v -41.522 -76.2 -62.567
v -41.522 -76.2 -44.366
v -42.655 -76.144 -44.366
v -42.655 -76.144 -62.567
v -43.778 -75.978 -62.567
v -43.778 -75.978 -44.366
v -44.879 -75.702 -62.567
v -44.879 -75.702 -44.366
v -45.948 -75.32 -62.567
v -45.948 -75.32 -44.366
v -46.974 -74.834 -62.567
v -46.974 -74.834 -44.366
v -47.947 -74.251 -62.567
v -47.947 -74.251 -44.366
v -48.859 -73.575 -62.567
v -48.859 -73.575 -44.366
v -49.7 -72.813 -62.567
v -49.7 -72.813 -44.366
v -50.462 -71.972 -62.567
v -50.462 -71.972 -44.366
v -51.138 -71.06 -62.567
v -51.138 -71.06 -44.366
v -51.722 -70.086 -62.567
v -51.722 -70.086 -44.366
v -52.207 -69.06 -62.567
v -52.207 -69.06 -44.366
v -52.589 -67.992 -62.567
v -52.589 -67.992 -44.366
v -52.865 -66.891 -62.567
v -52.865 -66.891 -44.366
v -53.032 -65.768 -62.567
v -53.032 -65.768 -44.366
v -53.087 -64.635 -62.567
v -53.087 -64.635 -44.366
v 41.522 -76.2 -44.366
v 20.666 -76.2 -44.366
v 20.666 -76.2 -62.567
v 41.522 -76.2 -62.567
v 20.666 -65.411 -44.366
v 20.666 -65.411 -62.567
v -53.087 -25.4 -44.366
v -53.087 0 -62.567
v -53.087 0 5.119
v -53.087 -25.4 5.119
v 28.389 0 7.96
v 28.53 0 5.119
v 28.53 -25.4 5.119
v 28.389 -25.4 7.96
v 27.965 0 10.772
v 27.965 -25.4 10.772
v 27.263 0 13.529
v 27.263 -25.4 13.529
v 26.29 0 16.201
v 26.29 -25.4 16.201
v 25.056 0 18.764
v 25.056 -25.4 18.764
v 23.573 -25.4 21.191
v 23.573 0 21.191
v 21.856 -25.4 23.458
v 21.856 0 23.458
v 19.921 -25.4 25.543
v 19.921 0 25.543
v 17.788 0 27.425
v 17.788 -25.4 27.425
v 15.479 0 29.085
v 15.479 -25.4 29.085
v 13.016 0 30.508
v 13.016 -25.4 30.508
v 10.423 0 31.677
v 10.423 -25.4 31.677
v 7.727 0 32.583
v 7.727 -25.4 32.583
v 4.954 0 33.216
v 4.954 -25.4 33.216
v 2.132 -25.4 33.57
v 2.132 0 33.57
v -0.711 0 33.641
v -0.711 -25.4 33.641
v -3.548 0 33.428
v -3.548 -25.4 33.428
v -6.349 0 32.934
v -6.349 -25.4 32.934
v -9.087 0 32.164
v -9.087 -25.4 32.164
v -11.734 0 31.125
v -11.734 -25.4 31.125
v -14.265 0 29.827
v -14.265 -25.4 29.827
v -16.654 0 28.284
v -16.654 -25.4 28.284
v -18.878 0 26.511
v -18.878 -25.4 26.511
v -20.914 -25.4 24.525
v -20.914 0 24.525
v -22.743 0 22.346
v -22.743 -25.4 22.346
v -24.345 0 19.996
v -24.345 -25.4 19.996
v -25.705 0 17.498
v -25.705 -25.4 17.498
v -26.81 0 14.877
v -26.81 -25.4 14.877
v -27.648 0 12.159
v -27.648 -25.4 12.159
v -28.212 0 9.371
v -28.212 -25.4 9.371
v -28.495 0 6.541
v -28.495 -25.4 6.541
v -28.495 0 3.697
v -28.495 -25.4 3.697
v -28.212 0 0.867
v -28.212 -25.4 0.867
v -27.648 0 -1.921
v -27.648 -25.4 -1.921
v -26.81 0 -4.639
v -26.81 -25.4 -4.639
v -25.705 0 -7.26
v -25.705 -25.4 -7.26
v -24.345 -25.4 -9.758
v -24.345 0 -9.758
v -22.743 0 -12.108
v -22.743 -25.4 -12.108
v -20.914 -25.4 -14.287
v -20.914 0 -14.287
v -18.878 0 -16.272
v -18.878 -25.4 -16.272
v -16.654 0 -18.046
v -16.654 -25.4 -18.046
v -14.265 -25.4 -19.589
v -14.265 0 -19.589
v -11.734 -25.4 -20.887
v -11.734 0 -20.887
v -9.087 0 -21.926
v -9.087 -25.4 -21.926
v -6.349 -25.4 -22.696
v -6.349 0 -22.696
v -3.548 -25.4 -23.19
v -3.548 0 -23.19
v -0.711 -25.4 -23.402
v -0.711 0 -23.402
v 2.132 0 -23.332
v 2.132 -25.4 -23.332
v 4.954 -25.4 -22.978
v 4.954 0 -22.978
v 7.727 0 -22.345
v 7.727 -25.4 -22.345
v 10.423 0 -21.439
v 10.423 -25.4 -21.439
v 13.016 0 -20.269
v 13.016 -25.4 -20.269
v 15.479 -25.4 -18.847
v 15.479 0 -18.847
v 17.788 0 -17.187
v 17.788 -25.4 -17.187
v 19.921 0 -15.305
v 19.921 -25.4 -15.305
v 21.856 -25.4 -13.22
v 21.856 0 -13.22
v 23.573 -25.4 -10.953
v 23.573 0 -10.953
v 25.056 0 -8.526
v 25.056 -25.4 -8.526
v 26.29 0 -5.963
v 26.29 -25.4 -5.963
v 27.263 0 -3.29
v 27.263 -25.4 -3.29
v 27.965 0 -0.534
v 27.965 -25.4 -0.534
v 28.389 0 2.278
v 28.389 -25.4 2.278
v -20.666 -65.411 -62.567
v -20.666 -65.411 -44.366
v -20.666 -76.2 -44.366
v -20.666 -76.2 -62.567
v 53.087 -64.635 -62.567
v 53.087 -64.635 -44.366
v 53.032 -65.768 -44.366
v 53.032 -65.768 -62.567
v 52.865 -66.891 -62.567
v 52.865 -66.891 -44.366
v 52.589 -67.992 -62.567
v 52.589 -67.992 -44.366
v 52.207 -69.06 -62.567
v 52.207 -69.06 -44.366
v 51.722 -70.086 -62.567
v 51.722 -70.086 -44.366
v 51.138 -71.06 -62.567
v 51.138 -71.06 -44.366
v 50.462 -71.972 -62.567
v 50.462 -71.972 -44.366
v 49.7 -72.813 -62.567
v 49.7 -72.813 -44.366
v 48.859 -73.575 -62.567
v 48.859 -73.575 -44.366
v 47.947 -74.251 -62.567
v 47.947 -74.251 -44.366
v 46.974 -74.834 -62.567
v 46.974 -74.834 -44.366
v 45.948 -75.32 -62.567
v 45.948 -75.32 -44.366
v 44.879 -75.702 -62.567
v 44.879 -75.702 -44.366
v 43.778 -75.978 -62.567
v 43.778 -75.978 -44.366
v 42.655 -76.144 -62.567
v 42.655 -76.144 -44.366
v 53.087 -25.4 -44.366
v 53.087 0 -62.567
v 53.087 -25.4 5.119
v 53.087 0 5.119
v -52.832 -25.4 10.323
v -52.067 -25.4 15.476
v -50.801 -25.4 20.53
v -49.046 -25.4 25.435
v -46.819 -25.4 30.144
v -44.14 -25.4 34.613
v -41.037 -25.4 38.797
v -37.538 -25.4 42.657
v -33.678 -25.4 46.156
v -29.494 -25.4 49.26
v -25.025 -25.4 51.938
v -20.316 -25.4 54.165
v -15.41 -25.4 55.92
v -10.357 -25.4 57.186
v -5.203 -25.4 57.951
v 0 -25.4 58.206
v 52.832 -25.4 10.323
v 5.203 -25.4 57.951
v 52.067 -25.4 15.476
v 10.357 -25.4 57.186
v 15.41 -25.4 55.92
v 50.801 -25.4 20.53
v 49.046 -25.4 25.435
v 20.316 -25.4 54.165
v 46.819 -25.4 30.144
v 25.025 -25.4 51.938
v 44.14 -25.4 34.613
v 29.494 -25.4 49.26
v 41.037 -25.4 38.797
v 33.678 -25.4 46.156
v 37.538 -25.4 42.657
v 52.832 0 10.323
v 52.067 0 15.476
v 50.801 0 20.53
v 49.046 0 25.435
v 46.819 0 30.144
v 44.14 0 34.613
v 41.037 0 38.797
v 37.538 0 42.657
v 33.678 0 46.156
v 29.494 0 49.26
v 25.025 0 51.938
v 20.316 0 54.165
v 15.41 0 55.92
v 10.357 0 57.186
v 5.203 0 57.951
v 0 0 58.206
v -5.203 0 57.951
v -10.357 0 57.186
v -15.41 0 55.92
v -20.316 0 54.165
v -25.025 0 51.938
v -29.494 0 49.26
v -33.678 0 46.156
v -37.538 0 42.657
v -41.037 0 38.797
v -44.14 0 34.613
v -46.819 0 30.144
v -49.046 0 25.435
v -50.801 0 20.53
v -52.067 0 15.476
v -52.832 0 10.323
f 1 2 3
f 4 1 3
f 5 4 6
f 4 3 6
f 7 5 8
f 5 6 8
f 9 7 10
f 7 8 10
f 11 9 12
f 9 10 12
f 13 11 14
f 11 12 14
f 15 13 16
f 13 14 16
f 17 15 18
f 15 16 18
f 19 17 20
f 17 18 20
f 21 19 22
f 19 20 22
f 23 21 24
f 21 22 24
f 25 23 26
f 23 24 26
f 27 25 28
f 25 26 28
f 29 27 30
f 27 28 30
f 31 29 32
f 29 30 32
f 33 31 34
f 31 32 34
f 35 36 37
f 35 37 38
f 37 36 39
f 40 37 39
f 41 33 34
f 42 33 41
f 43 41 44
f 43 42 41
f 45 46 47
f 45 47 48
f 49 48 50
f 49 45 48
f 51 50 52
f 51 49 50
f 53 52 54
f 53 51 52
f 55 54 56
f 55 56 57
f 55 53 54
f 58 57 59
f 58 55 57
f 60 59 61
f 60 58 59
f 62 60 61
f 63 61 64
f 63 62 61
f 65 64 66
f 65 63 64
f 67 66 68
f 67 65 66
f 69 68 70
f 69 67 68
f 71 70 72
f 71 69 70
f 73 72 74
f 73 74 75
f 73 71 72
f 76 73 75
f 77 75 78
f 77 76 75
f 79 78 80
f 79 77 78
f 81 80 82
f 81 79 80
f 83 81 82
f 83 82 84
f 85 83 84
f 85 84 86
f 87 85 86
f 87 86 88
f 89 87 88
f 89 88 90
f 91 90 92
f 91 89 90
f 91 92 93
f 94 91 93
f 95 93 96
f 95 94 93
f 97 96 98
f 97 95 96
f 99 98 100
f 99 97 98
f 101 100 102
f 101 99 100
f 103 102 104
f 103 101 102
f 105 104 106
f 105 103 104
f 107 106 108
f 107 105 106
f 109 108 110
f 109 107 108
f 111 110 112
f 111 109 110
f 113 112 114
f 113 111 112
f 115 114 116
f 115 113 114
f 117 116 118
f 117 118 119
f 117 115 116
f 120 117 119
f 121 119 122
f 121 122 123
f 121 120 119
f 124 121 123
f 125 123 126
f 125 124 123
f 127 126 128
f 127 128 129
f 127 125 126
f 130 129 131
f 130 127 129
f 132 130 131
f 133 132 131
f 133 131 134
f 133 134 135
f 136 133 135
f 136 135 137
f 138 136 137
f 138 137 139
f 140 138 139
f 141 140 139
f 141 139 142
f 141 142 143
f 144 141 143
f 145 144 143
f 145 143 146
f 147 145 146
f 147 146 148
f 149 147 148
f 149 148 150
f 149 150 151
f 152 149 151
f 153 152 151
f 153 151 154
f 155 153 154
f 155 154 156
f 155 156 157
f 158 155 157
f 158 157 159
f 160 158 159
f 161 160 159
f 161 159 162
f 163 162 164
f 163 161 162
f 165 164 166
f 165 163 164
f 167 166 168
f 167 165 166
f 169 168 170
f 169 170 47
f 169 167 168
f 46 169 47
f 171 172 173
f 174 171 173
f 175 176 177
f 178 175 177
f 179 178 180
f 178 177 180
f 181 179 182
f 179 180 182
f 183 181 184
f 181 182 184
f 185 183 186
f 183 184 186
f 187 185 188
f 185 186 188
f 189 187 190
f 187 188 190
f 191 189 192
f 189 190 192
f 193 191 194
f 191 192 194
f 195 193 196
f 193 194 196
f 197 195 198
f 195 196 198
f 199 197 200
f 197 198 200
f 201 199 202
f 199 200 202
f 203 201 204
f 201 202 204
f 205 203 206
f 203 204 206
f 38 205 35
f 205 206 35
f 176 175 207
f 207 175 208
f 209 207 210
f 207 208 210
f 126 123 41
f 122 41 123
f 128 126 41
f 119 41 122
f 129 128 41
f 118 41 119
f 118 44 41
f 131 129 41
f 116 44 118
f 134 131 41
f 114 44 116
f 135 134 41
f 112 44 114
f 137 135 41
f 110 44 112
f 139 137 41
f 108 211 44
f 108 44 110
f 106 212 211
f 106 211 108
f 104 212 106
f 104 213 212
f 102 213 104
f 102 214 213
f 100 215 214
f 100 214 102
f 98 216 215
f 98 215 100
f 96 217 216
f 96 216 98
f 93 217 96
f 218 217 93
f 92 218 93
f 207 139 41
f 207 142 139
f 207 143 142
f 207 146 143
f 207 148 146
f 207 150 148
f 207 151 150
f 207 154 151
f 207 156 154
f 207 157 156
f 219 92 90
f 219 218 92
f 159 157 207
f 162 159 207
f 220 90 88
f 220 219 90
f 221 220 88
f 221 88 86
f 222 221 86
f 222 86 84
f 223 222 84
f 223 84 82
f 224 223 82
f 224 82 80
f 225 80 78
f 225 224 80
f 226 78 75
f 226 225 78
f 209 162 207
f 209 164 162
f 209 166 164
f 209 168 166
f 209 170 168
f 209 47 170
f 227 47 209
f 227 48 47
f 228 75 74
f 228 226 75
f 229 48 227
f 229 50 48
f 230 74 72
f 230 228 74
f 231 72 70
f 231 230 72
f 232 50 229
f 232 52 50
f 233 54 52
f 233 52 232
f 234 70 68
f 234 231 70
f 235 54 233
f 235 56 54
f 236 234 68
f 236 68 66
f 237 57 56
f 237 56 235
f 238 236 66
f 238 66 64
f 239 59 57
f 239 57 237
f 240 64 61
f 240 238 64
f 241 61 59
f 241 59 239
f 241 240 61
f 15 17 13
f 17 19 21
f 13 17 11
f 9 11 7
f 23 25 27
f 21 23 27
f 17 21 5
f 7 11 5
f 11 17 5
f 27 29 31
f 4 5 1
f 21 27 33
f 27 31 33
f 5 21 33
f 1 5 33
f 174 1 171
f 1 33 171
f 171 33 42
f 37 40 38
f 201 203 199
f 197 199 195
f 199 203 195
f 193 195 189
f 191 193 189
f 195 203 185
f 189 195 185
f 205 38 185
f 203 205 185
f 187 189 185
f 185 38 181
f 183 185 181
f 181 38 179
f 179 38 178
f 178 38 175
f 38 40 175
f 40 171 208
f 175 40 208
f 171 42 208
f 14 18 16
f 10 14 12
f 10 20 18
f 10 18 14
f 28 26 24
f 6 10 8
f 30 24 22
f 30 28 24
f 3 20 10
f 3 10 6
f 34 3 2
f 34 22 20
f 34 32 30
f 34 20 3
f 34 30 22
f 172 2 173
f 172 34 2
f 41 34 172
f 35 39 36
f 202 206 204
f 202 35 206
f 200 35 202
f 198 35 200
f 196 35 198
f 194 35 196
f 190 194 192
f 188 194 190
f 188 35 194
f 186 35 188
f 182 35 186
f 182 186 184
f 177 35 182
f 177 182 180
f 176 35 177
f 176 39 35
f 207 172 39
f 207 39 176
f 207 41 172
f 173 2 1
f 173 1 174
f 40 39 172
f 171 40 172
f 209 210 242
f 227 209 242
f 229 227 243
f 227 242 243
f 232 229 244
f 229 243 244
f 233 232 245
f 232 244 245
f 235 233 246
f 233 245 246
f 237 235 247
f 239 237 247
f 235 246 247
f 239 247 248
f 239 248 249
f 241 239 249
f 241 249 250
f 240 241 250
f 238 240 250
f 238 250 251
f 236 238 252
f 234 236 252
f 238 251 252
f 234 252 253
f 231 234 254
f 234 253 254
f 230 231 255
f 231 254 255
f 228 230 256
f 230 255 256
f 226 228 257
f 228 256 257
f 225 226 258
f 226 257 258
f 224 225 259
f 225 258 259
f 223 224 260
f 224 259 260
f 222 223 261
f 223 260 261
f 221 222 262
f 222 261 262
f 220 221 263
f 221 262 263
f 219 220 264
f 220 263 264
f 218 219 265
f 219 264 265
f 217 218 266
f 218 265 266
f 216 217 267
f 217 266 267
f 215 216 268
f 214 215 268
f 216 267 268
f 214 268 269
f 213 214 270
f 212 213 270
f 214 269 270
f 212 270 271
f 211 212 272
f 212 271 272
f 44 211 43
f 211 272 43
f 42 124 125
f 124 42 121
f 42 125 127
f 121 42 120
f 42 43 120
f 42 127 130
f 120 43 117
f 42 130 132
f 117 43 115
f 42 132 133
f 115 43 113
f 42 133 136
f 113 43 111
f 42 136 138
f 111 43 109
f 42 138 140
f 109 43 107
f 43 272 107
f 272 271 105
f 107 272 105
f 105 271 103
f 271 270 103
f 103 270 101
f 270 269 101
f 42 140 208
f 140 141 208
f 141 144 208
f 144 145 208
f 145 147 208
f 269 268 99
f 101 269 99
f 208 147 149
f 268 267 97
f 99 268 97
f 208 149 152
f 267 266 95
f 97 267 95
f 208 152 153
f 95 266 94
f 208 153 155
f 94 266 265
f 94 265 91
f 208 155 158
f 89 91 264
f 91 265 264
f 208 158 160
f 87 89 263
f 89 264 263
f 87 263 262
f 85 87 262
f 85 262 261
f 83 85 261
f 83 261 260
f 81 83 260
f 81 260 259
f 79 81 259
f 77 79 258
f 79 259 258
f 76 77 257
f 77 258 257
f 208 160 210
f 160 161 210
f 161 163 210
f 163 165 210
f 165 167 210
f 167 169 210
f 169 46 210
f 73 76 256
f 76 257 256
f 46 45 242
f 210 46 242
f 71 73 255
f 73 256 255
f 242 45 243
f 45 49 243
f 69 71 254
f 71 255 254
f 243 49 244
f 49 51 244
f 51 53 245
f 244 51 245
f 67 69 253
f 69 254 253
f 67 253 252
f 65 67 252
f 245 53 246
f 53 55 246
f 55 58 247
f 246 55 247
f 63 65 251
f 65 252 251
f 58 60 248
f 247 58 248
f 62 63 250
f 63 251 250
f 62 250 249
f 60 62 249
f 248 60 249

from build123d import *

# Parameters (mm, degrees)
F0_R     = 28.5304356899
F1_DEPTH = 25.4
F0_W     = 106.1744093895
F0_H     = 18.201328814
F2_DEPTH = 76.2
F4_DEPTH = 18.202328814


with BuildPart() as f1:
    # F0 (on Front) → F1 (new body)
    with BuildSketch(Plane.XZ):
        with BuildLine():
            Line((-53.0872046947, -44.3657338619), (53.0872046947, -44.3657338619))
            Line((53.0872046947, -44.3657338619), (53.0872046947, 5.1191230305))
            ThreePointArc((53.0872046947, 5.1191230305), (0, 58.2063277252), (-53.0872046947, 5.1191230305))
            Line((-53.0872046947, 5.1191230305), (-53.0872046947, -44.3657338619))
        make_face()
        with Locations((0, 5.1191230305)):
            Circle(F0_R, mode=Mode.SUBTRACT)
    extrude(amount=F1_DEPTH)

    # F0 (on Front) → F2 (join)
    with BuildSketch(Plane.XZ):
        with Locations((0, -53.4663982689)):
            Rectangle(F0_W, F0_H)
    extrude(amount=F2_DEPTH)

    # F3 (on face) → F4 (cut, through all)
    with BuildSketch(Plane.XY.offset(-44.3657338619)):
        with BuildLine():
            Line((53.0872046947, -76.2), (53.0872046947, -64.6345680475))
            ThreePointArc((53.0872046947, -64.6345680475), (49.6997681032, -72.8125634085), (41.5217727423, -76.2))
            Line((41.5217727423, -76.2), (53.0872046947, -76.2))
        make_face()
        with BuildLine():
            ThreePointArc((-41.5217727423, -76.2), (-49.6997681032, -72.8125634085), (-53.0872046947, -64.6345680475))
            Line((-53.0872046947, -64.6345680475), (-53.0872046947, -76.2))
            Line((-53.0872046947, -76.2), (-41.5217727423, -76.2))
        make_face()
        Polygon((0, -76.2), (20.6660944968, -76.2), (20.6660944968, -65.4110237956), (-20.6660944968, -65.4110237956), (-20.6660944968, -76.2), align=None)
    extrude(amount=-F4_DEPTH, mode=Mode.SUBTRACT)


solid = f1.part
